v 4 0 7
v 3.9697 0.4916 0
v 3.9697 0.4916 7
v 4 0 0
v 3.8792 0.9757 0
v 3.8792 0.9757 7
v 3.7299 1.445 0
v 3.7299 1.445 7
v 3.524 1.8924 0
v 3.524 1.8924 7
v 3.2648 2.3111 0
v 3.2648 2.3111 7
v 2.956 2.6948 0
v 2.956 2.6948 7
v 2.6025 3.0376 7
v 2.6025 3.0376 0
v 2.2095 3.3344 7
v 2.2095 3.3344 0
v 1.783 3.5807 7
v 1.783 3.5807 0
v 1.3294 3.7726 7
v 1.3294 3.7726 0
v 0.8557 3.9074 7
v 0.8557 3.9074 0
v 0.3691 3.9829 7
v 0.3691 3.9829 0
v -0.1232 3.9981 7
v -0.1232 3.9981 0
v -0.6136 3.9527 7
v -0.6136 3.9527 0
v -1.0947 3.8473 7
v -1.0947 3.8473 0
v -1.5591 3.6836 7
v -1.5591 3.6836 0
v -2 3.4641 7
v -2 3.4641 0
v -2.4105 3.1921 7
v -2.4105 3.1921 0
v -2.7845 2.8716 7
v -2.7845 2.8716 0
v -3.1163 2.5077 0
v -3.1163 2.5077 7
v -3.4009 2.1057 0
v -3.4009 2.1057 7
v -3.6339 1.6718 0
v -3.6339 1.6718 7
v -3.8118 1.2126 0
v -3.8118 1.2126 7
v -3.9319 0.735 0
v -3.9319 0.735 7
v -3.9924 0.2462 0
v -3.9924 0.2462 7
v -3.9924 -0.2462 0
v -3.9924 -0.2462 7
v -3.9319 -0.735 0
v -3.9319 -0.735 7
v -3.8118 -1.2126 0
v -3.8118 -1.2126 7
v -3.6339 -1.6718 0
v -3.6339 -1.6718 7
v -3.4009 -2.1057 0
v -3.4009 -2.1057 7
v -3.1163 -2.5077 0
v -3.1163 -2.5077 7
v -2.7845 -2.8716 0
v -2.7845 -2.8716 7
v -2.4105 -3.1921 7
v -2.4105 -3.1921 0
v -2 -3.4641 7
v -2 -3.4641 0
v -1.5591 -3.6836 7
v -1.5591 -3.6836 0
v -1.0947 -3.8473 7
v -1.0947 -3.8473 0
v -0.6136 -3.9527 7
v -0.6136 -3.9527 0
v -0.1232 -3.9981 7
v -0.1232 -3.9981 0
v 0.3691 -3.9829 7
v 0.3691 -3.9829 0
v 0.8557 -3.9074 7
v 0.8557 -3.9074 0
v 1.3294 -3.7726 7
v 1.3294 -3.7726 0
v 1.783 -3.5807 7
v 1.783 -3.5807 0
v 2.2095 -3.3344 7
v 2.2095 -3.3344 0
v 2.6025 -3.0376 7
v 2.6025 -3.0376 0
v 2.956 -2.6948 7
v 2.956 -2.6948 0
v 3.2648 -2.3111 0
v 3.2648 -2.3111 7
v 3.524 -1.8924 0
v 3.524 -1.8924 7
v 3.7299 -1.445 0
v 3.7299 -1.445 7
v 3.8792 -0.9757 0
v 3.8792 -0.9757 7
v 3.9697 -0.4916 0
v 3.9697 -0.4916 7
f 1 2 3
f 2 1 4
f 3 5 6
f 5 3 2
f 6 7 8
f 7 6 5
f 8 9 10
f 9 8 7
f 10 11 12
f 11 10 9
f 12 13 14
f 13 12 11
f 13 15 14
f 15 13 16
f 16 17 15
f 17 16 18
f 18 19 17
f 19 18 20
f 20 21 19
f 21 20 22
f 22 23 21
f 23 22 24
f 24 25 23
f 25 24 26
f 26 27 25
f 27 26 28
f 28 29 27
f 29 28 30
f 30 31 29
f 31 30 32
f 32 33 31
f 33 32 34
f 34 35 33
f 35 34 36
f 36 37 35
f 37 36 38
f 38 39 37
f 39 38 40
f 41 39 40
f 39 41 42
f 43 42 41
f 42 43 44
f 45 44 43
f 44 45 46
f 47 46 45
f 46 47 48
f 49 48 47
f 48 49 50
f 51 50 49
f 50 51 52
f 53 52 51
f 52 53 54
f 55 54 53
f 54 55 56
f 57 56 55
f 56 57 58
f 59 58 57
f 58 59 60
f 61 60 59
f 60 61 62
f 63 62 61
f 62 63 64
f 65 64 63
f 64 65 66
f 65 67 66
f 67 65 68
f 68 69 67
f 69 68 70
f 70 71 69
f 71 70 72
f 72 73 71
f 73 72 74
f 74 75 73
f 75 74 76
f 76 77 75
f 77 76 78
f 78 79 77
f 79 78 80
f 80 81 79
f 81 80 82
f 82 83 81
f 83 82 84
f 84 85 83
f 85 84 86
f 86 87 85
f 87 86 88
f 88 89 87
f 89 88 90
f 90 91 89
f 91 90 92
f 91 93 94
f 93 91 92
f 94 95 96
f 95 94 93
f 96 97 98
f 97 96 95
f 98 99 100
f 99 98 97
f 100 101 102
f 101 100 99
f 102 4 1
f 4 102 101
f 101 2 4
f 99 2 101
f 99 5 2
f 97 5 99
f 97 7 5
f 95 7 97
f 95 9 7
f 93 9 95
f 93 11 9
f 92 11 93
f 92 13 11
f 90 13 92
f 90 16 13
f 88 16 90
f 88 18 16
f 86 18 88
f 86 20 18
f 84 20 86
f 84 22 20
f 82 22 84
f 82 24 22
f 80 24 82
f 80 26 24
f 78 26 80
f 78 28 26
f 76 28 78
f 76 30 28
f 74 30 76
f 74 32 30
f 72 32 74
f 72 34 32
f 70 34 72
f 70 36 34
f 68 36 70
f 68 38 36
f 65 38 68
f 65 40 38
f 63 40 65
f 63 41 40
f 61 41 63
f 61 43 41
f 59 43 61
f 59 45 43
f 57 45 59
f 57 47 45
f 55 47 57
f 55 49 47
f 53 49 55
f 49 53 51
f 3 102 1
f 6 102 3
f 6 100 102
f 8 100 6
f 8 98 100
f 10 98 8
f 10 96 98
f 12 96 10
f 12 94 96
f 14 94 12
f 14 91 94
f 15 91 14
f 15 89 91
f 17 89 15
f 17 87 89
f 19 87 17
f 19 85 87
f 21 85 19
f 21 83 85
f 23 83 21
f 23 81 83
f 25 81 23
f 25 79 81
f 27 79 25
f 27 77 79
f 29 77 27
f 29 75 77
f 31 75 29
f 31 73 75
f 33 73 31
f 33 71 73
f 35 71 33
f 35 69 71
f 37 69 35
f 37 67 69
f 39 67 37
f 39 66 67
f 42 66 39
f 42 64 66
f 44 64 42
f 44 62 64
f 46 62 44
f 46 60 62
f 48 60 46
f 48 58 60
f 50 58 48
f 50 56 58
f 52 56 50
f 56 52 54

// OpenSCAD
// bearing hole diameter
bearing_id = 8;
bearing_height = 7;
/* [Hidden] */
$fa = 5;
$fs = 0.5;
cylinder(h=bearing_height, d=bearing_id);
